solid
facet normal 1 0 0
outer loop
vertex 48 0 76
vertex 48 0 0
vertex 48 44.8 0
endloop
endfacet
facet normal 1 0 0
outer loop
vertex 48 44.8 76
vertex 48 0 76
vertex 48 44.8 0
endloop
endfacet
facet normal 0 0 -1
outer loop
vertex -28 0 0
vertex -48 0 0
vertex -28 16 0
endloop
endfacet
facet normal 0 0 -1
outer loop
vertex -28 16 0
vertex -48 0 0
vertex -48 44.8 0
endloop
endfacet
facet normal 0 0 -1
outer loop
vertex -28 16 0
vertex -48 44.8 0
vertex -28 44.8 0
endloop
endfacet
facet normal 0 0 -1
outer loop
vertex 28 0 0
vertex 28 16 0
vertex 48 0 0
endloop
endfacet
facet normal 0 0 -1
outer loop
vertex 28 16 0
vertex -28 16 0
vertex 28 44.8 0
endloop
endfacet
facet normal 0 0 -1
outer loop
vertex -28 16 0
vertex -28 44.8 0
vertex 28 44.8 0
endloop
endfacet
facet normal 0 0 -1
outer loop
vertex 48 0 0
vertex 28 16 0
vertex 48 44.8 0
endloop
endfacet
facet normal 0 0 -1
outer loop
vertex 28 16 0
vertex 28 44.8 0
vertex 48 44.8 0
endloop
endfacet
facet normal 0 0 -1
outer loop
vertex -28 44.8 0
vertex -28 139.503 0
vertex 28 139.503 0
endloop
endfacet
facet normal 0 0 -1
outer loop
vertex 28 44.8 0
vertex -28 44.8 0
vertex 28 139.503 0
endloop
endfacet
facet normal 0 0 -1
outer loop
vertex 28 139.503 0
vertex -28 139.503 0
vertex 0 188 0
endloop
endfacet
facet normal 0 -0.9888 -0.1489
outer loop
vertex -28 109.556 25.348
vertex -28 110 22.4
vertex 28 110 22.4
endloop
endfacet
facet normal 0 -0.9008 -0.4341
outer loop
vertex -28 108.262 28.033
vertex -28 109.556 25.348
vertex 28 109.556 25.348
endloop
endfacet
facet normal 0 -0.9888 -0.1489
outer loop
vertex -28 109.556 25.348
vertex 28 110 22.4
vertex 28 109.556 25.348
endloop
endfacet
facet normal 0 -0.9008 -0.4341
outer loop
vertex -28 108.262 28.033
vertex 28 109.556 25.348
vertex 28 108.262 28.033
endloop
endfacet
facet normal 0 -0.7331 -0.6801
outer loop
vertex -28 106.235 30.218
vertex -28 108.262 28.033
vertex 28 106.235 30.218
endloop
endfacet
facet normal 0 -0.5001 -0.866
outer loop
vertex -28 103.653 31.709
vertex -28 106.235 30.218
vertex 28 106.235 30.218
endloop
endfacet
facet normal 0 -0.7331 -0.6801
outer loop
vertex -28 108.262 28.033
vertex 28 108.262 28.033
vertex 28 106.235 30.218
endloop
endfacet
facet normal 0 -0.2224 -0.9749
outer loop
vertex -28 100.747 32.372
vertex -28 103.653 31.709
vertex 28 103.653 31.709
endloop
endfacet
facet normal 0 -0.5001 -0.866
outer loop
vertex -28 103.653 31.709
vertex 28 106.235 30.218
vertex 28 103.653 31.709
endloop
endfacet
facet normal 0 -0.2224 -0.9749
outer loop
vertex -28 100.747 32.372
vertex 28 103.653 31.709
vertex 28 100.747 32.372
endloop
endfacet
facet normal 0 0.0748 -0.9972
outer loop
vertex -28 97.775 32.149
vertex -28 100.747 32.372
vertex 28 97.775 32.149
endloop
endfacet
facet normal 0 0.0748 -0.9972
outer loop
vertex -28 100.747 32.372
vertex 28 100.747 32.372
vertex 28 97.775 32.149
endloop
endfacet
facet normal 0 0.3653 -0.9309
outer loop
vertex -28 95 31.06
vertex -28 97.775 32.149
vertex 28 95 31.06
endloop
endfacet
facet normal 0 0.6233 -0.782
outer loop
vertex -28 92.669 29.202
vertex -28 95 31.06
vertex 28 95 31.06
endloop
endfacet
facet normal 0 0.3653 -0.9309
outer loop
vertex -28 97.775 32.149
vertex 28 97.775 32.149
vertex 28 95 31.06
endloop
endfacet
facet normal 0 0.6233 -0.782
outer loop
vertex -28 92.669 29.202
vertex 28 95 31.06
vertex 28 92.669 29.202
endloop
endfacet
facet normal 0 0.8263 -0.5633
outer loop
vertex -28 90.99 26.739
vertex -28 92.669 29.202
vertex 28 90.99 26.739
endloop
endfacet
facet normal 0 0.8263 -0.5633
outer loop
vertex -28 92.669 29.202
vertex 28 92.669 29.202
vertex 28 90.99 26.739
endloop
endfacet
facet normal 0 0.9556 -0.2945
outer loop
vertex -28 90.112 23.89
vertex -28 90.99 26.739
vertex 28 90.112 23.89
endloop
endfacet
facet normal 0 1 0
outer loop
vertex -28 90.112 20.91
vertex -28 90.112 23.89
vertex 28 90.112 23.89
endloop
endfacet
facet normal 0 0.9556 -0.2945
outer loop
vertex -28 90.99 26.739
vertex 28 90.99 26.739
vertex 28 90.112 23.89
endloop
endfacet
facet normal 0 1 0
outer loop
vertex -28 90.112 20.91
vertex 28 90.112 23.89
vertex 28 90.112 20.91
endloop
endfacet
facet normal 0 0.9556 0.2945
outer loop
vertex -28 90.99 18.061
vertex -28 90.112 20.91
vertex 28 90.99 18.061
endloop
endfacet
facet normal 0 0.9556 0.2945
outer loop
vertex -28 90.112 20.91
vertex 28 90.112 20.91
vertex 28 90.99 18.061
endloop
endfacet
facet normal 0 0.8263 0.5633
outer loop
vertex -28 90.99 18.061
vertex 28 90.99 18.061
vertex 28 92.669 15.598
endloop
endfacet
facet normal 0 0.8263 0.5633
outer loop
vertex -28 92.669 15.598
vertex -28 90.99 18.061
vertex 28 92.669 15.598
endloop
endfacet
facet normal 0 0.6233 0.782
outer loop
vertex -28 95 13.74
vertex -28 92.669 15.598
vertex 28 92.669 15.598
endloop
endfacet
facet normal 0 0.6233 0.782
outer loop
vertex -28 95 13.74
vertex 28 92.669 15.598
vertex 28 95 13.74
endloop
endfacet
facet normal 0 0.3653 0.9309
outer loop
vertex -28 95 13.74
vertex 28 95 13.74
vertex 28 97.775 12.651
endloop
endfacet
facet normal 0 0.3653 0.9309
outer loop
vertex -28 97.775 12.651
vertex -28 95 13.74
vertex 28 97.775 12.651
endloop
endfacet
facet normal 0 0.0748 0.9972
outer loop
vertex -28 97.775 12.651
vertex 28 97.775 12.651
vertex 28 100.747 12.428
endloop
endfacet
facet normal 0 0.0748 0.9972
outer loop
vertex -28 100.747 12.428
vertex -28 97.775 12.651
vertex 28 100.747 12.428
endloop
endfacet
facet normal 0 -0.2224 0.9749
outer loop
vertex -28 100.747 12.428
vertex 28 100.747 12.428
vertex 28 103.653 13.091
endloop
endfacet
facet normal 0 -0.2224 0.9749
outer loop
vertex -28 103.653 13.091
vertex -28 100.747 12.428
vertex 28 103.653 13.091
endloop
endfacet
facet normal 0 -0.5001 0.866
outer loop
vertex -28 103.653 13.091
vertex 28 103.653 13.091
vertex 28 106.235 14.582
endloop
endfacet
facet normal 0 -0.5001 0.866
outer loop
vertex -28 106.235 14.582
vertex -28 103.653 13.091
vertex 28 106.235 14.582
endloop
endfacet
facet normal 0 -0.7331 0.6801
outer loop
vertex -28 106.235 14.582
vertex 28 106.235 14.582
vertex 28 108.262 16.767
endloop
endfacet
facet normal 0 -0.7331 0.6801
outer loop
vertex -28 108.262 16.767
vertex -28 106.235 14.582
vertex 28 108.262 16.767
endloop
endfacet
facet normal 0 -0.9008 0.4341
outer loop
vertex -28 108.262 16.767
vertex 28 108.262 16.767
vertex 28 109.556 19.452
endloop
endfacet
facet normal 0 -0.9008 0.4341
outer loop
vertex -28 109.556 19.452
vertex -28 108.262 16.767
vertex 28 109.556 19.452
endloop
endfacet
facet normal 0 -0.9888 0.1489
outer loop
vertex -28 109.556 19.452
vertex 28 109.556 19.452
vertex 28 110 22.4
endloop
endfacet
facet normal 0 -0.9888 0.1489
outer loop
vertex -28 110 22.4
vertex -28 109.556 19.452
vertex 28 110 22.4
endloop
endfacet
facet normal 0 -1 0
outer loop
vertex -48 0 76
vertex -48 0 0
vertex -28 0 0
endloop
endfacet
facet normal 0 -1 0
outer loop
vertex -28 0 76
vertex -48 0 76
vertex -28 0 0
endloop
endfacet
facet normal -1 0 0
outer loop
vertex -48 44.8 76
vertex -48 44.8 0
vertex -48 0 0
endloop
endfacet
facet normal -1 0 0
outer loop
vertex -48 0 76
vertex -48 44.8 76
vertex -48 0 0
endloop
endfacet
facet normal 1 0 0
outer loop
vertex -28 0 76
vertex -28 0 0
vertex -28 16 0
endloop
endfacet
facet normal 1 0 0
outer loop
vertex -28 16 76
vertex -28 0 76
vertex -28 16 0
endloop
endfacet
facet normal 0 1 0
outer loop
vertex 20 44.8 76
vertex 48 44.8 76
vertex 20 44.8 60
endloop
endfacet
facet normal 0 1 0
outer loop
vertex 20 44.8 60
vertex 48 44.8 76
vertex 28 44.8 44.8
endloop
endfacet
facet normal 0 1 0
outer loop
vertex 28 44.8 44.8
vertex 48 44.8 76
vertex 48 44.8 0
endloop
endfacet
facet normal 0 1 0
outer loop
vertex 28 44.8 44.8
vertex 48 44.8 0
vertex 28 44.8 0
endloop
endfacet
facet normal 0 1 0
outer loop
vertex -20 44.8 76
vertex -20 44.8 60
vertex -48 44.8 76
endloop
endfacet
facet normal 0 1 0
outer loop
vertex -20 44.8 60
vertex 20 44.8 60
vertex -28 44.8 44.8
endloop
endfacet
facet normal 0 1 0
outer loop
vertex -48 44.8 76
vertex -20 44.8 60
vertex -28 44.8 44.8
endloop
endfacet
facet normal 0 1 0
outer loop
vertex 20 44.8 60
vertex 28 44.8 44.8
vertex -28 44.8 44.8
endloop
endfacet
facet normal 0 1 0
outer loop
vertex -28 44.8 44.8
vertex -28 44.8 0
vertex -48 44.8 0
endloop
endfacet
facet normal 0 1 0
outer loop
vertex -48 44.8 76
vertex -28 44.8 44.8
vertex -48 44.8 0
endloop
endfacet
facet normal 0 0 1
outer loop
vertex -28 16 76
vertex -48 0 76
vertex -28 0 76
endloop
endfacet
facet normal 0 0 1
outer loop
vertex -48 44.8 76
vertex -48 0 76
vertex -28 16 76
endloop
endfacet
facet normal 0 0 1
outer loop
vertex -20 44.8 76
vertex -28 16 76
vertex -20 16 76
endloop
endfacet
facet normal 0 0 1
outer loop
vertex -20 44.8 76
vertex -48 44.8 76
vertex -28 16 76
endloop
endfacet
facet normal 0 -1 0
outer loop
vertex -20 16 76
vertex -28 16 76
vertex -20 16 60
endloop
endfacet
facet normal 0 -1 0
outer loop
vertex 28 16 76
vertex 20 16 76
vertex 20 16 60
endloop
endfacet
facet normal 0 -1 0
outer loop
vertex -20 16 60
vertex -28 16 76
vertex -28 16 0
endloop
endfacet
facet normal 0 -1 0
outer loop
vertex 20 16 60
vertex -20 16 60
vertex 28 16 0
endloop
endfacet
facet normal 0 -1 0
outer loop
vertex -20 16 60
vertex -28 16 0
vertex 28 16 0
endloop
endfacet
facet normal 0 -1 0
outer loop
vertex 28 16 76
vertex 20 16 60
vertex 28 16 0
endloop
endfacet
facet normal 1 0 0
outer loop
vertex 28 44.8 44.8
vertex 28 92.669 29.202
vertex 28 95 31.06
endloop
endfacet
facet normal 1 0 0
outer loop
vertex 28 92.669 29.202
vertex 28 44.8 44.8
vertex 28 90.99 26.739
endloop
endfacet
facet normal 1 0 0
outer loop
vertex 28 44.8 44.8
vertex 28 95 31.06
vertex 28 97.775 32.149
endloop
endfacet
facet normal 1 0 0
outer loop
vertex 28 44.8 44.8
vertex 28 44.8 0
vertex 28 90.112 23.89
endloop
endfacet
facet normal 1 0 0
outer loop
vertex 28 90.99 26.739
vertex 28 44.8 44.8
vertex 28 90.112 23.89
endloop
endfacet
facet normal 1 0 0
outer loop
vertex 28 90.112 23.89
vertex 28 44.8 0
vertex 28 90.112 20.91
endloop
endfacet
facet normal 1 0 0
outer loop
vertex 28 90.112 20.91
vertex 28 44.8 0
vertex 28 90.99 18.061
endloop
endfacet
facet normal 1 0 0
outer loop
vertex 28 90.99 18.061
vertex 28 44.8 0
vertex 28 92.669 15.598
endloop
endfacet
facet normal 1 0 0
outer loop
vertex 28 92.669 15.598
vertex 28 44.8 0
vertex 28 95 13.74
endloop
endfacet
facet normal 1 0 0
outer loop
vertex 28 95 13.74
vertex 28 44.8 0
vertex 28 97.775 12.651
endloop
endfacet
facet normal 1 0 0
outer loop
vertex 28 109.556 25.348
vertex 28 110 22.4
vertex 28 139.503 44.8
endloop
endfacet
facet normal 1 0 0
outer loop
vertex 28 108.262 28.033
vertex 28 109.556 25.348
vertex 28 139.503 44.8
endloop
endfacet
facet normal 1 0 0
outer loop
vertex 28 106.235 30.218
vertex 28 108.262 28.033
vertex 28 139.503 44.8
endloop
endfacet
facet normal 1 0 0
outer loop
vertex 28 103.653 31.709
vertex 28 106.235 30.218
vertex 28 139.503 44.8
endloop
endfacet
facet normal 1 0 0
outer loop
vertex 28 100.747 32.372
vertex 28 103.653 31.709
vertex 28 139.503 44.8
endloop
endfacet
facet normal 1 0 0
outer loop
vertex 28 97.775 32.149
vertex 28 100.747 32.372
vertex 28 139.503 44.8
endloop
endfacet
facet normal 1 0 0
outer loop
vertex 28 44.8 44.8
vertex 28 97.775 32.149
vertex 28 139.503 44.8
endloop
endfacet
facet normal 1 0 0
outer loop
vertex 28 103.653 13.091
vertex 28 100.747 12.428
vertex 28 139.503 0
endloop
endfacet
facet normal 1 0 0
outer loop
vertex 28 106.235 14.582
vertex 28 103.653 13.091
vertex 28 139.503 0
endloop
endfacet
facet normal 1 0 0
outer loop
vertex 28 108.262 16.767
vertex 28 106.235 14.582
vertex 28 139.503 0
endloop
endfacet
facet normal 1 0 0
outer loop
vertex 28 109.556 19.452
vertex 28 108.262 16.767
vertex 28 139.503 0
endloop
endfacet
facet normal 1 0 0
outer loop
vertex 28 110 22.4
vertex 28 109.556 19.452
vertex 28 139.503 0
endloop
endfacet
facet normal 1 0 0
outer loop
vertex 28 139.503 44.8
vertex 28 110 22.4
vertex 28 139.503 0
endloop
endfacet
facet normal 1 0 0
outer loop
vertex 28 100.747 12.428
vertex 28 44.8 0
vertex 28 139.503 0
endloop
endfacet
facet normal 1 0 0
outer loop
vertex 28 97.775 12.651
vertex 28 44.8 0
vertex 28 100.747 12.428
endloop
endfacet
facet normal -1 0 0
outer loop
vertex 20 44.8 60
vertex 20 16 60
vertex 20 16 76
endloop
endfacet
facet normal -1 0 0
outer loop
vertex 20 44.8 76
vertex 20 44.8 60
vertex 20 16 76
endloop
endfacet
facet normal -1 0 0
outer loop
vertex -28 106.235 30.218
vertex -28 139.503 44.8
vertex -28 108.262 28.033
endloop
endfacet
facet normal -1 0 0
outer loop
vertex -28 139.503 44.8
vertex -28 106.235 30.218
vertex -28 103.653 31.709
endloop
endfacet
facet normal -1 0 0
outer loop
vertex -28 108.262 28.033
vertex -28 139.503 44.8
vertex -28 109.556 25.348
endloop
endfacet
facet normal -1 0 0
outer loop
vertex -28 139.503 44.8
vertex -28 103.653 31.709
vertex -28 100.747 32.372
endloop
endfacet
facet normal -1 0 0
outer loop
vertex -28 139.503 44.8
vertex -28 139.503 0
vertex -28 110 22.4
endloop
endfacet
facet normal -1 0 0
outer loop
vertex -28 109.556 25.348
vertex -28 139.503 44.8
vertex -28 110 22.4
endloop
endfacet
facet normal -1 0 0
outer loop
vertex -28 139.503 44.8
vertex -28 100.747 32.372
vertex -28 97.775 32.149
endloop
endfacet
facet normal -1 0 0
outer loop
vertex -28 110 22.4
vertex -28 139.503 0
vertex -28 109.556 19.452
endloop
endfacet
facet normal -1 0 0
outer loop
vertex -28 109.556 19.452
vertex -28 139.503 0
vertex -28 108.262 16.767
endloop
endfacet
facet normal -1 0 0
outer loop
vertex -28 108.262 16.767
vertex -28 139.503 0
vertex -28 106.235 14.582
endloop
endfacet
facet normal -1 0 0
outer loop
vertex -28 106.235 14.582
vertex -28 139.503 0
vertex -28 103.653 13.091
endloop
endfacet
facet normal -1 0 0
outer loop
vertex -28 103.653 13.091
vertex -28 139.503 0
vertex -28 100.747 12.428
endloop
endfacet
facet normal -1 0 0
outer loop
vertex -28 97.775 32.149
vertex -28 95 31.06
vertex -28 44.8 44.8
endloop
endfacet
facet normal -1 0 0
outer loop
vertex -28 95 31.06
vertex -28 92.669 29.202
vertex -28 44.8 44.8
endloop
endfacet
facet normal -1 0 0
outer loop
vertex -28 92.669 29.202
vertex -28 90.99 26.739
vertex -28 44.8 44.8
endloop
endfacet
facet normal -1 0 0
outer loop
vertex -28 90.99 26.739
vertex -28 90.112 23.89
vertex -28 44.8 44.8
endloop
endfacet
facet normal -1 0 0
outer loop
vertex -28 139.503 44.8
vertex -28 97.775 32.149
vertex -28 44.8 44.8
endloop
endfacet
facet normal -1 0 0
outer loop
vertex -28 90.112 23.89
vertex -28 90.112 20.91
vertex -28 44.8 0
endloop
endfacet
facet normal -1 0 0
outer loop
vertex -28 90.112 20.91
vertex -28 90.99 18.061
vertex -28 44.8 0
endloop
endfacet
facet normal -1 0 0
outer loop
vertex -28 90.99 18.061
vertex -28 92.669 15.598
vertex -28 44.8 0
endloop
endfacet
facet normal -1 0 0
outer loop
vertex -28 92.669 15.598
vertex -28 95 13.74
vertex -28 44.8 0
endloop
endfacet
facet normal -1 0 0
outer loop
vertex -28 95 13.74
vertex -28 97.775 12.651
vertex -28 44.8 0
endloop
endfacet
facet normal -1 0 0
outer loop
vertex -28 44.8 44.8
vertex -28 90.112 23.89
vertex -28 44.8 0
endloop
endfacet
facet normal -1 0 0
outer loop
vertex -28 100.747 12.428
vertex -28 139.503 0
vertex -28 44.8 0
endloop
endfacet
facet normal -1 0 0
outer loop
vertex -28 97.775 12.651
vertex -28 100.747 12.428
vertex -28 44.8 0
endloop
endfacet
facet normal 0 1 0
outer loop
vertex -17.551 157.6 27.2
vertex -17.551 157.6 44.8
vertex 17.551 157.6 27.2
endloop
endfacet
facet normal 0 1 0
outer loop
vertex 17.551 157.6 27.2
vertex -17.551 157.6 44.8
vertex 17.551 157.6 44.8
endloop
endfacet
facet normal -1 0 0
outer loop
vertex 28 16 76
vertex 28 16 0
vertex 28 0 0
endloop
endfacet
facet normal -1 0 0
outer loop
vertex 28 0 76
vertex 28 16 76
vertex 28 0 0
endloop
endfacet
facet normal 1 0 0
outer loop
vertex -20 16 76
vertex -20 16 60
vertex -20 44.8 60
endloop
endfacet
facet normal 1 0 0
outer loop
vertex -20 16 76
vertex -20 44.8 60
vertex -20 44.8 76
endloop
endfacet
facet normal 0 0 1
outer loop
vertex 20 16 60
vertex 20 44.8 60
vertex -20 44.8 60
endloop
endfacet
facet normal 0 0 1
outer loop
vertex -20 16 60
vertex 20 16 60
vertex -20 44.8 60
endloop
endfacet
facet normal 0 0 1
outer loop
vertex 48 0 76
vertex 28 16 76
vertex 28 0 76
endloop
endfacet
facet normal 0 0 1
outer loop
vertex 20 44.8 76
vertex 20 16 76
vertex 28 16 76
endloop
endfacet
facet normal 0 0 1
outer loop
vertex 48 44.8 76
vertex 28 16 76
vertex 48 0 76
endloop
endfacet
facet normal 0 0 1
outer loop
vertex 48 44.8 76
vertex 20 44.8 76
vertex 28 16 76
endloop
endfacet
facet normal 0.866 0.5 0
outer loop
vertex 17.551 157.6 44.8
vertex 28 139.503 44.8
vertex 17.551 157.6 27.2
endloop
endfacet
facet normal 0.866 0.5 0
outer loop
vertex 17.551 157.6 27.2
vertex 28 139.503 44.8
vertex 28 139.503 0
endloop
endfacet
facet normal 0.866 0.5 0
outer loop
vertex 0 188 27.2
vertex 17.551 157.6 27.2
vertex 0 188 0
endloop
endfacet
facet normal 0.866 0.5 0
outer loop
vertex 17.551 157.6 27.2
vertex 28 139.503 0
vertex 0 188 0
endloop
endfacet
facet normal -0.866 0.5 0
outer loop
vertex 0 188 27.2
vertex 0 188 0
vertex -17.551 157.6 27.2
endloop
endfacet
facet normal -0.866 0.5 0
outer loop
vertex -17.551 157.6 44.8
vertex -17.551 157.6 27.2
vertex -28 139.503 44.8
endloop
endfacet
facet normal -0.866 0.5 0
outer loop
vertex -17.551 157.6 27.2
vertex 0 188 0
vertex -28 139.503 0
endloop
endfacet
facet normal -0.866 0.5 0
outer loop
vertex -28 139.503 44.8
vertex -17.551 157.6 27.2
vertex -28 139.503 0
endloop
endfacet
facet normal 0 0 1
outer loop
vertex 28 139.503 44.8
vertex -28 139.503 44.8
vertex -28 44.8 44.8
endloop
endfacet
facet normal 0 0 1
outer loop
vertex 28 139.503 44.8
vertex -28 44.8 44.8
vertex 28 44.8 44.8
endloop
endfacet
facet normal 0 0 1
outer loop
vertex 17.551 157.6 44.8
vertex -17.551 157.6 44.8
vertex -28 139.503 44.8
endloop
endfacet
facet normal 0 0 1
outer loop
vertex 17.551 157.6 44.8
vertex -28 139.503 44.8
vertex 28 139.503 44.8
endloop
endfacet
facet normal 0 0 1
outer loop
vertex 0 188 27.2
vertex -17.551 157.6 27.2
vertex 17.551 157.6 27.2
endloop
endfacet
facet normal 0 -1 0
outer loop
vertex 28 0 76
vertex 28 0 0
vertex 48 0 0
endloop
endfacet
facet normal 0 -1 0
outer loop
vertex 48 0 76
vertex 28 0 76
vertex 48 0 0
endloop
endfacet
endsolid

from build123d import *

# Parameters (mm, degrees)
PAD_DEPTH       = 76
POCKET_DEPTH    = 143.2
SKETCH002_W     = 40
SKETCH002_H     = 16
POCKET001_DEPTH = 44.801
POCKET002_DEPTH = 17.6
SKETCH004_R     = 10
POCKET003_DEPTH = 76.001


with BuildPart() as part:
    # Sketch → Pad (new body)
    with BuildSketch(Plane.XY):
        Polygon((-48, 44.8), (-48, 0), (-28, 0), (-28, 16), (28, 16), (28, 0), (48, 0), (48, 44.8), (28, 44.8), (28, 139.502577), (0, 188), (-28, 139.502577), (-28, 44.8), align=None)
    extrude(amount=PAD_DEPTH)

    # Sketch001 (on DatumPlane) → Pocket (cut)
    with BuildSketch(Plane.XZ.offset(-188)):
        Polygon((48, 76), (-48, 76), (-48, 0), (-28, 0), (-28, 44.8), (28, 44.8), (28, 0), (48, 0), align=None)
    extrude(amount=POCKET_DEPTH, mode=Mode.SUBTRACT)

    # Sketch002 (on Face7 of Pocket) → Pocket001 (cut, through all)
    with BuildSketch(Plane(origin=(0, 44.8, 0), x_dir=(-1, 0, 0), z_dir=(0, 1, 0))):
        with Locations((0, 68)):
            Rectangle(SKETCH002_W, SKETCH002_H)
    extrude(amount=-POCKET001_DEPTH, mode=Mode.SUBTRACT)

    # Sketch003 (on Face18 of Pocket001) → Pocket002 (cut)
    with BuildSketch(Plane.XY.offset(44.8)):
        Polygon((0, 188), (-17.551448, 157.6), (17.551448, 157.6), align=None)
    extrude(amount=-POCKET002_DEPTH, mode=Mode.SUBTRACT)

    # Sketch004 (on Face14 of Pocket002) → Pocket003 (cut, through all)
    with BuildSketch(Plane.YZ.offset(28)):
        with Locations((100, 22.4)):
            Circle(SKETCH004_R)
    extrude(amount=-POCKET003_DEPTH, mode=Mode.SUBTRACT)


solid = part.part
